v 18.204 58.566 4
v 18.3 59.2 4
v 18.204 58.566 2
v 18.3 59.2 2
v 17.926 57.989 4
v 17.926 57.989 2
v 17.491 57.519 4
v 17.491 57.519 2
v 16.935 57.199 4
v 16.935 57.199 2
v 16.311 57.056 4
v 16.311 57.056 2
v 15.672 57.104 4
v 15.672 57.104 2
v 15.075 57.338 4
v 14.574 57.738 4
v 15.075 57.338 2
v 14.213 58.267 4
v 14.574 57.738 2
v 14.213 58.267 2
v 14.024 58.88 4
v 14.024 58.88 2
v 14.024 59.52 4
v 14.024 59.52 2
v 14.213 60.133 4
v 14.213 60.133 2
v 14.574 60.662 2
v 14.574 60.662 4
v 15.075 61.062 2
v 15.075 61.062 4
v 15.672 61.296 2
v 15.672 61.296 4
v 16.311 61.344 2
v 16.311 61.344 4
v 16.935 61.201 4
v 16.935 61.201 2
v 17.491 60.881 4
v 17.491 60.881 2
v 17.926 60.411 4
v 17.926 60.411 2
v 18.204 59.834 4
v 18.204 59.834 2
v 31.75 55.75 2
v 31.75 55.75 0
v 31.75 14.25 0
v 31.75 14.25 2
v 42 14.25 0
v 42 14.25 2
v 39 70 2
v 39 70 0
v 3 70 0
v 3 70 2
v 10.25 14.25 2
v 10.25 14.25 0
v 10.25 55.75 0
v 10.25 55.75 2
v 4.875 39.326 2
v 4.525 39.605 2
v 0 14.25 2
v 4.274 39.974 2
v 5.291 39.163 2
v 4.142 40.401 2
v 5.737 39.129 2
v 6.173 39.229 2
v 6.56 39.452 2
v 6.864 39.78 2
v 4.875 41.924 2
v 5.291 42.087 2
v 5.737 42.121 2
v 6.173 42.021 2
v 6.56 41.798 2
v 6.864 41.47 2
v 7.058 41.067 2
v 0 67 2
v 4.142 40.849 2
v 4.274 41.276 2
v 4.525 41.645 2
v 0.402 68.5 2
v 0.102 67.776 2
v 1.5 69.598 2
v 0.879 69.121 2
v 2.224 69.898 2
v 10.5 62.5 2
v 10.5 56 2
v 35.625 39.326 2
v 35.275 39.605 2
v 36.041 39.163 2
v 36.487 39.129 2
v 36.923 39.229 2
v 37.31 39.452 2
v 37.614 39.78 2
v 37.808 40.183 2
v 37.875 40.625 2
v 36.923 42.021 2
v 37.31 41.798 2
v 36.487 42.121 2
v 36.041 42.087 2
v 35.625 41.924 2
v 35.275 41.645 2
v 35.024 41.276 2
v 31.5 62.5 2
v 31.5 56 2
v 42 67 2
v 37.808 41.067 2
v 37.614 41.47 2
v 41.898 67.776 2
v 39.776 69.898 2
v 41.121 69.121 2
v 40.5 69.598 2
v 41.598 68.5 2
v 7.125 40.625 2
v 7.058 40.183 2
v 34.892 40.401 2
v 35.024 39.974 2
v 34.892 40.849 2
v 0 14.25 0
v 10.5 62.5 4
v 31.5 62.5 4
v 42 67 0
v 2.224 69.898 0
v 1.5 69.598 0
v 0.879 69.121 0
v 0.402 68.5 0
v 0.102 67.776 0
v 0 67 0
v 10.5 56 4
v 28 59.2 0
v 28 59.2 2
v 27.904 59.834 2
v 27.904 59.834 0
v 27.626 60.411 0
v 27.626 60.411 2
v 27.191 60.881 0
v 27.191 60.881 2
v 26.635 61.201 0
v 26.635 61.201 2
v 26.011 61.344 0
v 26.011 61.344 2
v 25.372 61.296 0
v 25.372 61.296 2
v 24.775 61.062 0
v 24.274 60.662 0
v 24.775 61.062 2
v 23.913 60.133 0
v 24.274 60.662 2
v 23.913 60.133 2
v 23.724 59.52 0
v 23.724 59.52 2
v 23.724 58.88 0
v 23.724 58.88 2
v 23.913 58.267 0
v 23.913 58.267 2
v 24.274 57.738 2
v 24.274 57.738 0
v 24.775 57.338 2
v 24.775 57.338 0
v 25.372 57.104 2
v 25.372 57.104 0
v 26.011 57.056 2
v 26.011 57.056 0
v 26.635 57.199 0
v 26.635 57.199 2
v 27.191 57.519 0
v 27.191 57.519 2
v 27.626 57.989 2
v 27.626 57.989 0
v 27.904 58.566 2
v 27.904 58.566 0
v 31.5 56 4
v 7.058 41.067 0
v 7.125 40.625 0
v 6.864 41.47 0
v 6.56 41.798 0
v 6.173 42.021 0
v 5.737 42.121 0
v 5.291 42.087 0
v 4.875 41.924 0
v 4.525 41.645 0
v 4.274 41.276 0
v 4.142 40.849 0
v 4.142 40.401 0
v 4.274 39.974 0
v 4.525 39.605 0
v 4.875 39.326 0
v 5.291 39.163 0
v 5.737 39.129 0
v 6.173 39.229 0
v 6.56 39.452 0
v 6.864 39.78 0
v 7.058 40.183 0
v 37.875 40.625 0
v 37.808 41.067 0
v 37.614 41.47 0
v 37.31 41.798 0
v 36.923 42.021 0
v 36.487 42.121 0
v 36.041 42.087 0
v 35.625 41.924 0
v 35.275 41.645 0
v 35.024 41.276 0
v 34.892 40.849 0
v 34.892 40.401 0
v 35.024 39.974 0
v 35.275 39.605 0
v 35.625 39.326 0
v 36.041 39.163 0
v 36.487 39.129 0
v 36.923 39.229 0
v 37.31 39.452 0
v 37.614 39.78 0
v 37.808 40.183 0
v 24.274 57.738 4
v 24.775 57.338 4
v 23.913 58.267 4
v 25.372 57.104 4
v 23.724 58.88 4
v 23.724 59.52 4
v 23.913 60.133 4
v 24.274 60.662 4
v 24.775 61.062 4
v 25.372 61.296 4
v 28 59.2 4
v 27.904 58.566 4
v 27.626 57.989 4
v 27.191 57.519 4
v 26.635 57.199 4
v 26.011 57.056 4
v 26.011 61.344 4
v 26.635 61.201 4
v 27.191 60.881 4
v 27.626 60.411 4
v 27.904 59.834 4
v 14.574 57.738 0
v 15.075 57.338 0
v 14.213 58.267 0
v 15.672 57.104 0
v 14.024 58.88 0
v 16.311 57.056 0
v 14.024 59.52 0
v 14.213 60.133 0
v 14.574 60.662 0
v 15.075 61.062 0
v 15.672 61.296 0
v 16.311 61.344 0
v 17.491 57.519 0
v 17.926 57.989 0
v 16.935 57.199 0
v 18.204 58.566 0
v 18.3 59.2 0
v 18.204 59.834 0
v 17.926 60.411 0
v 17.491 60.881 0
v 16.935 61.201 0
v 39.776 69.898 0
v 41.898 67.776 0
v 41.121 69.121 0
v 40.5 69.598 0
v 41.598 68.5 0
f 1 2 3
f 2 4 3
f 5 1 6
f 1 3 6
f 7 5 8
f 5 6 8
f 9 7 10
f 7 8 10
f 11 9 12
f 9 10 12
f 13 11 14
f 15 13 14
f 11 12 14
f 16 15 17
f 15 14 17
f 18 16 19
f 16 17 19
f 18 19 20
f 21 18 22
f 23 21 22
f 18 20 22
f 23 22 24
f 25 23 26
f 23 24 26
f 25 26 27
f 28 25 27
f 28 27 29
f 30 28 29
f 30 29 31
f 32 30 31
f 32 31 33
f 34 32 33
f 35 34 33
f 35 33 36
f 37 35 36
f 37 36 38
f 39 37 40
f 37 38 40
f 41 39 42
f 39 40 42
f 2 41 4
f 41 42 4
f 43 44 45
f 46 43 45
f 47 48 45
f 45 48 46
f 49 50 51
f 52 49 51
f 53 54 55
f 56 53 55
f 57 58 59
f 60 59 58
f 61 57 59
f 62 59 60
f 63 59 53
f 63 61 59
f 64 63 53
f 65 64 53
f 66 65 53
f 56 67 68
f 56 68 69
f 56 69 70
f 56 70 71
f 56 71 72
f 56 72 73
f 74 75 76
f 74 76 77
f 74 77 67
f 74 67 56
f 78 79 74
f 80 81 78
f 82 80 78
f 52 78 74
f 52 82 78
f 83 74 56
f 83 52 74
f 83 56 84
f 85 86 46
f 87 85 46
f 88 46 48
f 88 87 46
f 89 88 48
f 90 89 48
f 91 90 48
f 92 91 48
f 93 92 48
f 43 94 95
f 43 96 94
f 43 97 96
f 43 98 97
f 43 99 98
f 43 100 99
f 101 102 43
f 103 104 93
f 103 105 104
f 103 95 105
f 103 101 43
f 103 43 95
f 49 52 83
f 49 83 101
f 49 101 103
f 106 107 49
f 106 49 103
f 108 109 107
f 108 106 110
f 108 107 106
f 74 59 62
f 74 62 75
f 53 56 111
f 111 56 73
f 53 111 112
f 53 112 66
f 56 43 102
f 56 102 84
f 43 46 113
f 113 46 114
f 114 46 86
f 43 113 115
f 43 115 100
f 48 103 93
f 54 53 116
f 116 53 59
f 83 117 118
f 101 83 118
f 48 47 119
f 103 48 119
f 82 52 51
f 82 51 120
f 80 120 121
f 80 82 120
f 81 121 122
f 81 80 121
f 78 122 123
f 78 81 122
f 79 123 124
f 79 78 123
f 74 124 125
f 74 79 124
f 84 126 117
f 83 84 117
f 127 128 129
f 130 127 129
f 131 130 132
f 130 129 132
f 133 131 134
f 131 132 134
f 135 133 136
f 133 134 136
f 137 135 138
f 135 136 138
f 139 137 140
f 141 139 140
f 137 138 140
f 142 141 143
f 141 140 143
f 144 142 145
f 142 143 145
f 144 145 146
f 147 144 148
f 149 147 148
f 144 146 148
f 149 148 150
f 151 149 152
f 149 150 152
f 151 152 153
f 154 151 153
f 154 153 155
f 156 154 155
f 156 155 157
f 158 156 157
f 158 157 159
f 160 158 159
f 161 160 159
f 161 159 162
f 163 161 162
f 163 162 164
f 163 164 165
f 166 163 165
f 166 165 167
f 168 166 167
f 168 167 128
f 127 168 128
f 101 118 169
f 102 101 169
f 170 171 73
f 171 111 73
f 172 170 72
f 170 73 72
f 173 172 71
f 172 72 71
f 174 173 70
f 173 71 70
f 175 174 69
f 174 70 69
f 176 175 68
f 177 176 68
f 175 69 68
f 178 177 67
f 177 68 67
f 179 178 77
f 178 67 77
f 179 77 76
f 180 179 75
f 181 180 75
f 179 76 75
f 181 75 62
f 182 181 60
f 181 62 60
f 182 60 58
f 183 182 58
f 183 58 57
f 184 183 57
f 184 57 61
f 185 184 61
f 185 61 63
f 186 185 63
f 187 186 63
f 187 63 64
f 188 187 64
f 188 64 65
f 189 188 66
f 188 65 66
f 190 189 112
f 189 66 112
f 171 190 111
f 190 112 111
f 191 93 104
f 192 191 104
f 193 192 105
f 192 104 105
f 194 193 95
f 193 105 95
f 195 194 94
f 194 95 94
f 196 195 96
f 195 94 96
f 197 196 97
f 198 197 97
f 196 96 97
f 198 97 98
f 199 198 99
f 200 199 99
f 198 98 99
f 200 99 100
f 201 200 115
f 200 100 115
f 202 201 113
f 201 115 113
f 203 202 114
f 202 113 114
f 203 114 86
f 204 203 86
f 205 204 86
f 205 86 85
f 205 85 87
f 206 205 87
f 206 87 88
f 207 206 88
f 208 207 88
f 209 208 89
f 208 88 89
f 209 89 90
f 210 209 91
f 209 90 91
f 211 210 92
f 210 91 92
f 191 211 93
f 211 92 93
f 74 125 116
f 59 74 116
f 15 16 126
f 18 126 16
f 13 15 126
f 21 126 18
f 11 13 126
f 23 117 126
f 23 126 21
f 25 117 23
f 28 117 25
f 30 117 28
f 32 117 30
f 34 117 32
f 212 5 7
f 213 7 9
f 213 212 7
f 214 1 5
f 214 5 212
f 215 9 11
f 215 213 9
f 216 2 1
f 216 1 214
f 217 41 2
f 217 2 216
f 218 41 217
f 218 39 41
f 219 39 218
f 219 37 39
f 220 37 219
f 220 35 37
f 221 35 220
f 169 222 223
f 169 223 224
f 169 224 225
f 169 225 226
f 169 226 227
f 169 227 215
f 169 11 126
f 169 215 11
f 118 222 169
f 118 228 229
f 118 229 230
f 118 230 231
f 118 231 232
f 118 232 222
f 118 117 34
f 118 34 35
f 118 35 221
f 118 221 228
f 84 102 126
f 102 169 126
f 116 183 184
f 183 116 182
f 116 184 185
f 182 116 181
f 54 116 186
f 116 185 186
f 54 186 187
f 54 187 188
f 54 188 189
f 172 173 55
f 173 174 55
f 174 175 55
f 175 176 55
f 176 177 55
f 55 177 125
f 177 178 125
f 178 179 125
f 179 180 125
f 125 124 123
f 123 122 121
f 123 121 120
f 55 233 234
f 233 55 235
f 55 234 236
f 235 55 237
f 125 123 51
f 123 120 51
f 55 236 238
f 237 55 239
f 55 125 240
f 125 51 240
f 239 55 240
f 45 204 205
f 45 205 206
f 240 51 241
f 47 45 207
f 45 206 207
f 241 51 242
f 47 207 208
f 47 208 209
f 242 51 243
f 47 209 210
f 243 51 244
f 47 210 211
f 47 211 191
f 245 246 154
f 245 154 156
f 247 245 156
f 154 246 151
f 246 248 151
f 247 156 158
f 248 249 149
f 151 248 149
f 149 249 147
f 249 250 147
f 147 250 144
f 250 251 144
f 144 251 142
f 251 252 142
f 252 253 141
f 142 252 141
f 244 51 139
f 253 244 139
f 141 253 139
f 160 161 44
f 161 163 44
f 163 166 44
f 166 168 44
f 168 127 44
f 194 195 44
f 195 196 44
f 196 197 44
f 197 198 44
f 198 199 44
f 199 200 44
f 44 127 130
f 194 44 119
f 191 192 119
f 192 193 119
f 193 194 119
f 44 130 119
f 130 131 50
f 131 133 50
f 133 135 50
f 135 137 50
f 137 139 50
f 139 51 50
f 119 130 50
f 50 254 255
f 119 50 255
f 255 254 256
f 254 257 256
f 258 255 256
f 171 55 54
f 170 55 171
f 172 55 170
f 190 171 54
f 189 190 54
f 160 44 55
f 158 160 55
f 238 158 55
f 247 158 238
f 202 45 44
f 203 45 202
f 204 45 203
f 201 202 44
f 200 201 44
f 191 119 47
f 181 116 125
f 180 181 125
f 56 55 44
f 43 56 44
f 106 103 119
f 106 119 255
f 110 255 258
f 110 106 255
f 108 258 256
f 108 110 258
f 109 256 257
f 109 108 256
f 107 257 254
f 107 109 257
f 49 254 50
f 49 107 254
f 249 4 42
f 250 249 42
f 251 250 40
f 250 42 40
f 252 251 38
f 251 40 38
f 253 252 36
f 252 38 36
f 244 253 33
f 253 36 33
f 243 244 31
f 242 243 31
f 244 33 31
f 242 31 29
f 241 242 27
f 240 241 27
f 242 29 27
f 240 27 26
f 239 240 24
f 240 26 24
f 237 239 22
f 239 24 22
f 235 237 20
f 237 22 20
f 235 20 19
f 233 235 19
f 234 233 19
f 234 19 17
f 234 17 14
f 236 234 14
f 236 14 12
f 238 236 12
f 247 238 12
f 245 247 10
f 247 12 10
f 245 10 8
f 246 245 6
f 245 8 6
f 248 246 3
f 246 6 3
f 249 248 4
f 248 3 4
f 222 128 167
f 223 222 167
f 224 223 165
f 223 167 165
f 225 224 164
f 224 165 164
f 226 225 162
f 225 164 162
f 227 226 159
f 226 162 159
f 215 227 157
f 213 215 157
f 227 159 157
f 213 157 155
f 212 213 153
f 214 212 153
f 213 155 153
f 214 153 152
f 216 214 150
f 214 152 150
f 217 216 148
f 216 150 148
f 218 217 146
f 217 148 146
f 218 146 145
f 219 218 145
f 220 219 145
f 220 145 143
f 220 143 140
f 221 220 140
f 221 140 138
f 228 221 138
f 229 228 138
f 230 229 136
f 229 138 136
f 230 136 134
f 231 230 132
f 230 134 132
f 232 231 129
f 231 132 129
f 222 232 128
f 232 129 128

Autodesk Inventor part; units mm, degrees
ref_plane "YZ Plane" through (0, 0, 0) normal (1, 0, 0) x (0, 1, 0)
ref_plane "XZ Plane" through (0, 0, 0) normal (0, 1, 0) x (-1, 0, 0)
ref_plane "XY Plane" through (0, 0, 0) normal (0, 0, 1) x (1, 0, 0)
sketch "Sketch1" plane through (0, 0, 0) normal (0, 0, 1) x (1, 0, 0)
  line L0 (0, 0) -> (42, 0)
  line L1 (42, 0) -> (42, 70)
  line L2 (42, 70) -> (0, 70)
  line L3 (0, 70) -> (0, 0)
  line L4 (31.75, 14.25) -> (10.25, 14.25)
  line L5 (10.25, 14.25) -> (10.25, 55.75)
  line L6 (10.25, 55.75) -> (31.75, 55.75)
  line L7 (31.75, 55.75) -> (31.75, 14.25)
  line L8 (31.75, 14.25) -> (10.25, 55.75) construction
  line L9 (10.25, 14.25) -> (31.75, 55.75) construction
  line L10 (21, 70) -> (21, 0)
  line L11 (0, 35) -> (42, 35)
  point P0 (21, 35)
  point P1 (10.8, 7)
  point P2 (31.2, 7)
  point P3 (31.2, 0)
  point P4 (10.8, 0)
  point P5 (31.75, 35)
  point P6 (21, 35)
  point P7 (10.25, 35)
  point P8 (21, 14.25)
  point P9 (21, 55.75)
  dimension "d0" = 42
  dimension "d1" = 70
  dimension "d4" = 21.5
  dimension "d5" = 41.5
extrude "Extrusion1" add sketch "Sketch1" along normal blind 2
fillet "Fillet3" radius 3 2 edges at (42, 70, 1) (0, 70, 1)
extrude "Extrusion11" cut sketch "Sketch1" along normal blind 6 contours L10 L11 L7 L4 | L4 L5 L11 L10 | L5 L6 L10 L11 | L10 L6 L7 L11
sketch "Sketch14" plane through (0, 0, 2) normal (0, 0, 1) x (1, 0, 0)
  line L0 (31.75, 55.75) -> (10.25, 55.75) projected
  circle A0 centre (16.15, 59.2) radius 2.15
  circle A1 centre (25.85, 59.2) radius 2.15
  line L1 (16.15, 59.2) -> (25.85, 59.2)
  line L2 (10.8, 35) -> (31.2, 35)
  circle A2 centre (16.15, 10.8) radius 2.15
  circle A3 centre (25.85, 10.8) radius 2.15
  line L3 (16.15, 10.8) -> (25.85, 10.8)
  line L4 (0, 0) -> (42, 0) projected
  arc A4 (3, 70) -> (0, 67) centre (3, 67) ccw projected
  line L5 (0, 67) -> (0, 0) projected
  line L6 (42, 0) -> (42, 67) projected
  arc A5 (42, 67) -> (39, 70) centre (39, 67) ccw projected
  line L7 (39, 70) -> (3, 70) projected
  point P0 (21, 59.2)
  dimension "d54" = 4.3
  dimension "d55" = 4.3
  dimension "d56" = 9.7
extrude "Extrusion12" cut sketch "Sketch14" against normal blind 6 contours A0 | A1 | A2 | A3
sketch "Sketch17" plane through (0, 0, 2) normal (0, 0, 1) x (1, 0, 0)
  circle A0 centre (16.15, 10.8) radius 2.15 projected
  circle A1 centre (25.85, 59.2) radius 2.15 projected
  circle A2 centre (25.85, 10.8) radius 2.15 projected
  circle A3 centre (16.15, 59.2) radius 2.15 projected
  line L0 (10.25, 55.75) -> (31.75, 55.75) projected
  line L1 (31.75, 55.75) -> (31.75, 14.25) projected
  line L2 (31.75, 14.25) -> (10.25, 14.25) projected
  line L3 (10.25, 14.25) -> (10.25, 55.75) projected
  circle A4 centre (16.15, 59.2) radius 2.15 projected
  circle A5 centre (25.85, 59.2) radius 2.15 projected
  line L4 (16.15, 61.35) -> (25.85, 61.35)
  line L5 (25.85, 59.2) -> (25.85, 61.35)
  line L6 (14, 59.2) -> (14, 55.75)
  line L7 (28, 59.2) -> (28, 55.75)
  line L8 (10.25, 55.75) -> (10.25, 14.25) projected
  line L9 (10.25, 55.75) -> (10.25, 62.75)
  line L10 (10.25, 62.75) -> (31.75, 62.75)
  line L11 (31.75, 62.75) -> (31.75, 55.75)
  line L12 (0, 0) -> (42, 0) projected
  arc A6 (3, 70) -> (0, 67) centre (3, 67) ccw projected
  line L13 (0, 67) -> (0, 0) projected
  line L14 (42, 0) -> (42, 67) projected
  arc A7 (42, 67) -> (39, 70) centre (39, 67) ccw projected
  line L15 (39, 70) -> (3, 70) projected
  dimension "d67" = 7
extrude "Extrusion15" add sketch "Sketch17" along normal blind 2 contours L7 L0 L6 A3 L4 A1 | A1 L4 A3 L6 L0 L9 L10 L11 L7
sketch "Sketch18" plane through (0, 0, 2) normal (0, 0, 1) x (1, 0, 0)
  line L0 (10.25, 14.25) -> (10.25, 55.75) projected
  line L1 (10.25, 62.75) -> (31.75, 62.75) projected
  line L2 (31.75, 55.75) -> (31.75, 14.25) projected
  line L3 (31.75, 14.25) -> (10.25, 14.25) projected
  circle A0 centre (25.85, 10.8) radius 2.15 projected
  circle A1 centre (16.15, 10.8) radius 2.15 projected
  line L4 (10.25, 40.625) -> (5.625, 40.625)
  line L5 (5.625, 40.625) -> (5.625, 69)
  circle A2 centre (5.625, 40.625) radius 1.5
  line L6 (21, 80.706) -> (21, -3.1342)
  circle A3 centre (36.375, 40.625) radius 1.5
  line L7 (0, 0) -> (42, 0) projected
  arc A4 (3, 70) -> (0, 67) centre (3, 67) ccw projected
  line L8 (0, 67) -> (0, 0) projected
  line L9 (42, 0) -> (42, 67) projected
  arc A5 (42, 67) -> (39, 70) centre (39, 67) ccw projected
  line L10 (39, 70) -> (3, 70) projected
  line L11 (10.25, 55.75) -> (10.25, 62.75) projected
  line L12 (31.75, 62.75) -> (31.75, 55.75) projected
  dimension "d70" = 4.625
  dimension "d71" = 28.375
  dimension "d72" = 3
  dimension "d75" = 30.75
extrude "Extrusion16" cut sketch "Sketch18" against normal blind 10 contours A2 L5 L4 | L4 L5 A2 | A3
sketch "Sketch22" plane through (0, 0, 2) normal (0, 0, 1) x (1, 0, 0)
  point P0 (0, 0)
sketch "Sketch23" plane through (0, 0, 4) normal (0, 0, 1) x (1, 0, 0)
  line L0 (31.75, 55.75) -> (31.75, 62.75) projected
  line L1 (31.75, 62.75) -> (10.25, 62.75) projected
  line L2 (10.25, 62.75) -> (10.25, 55.75) projected
  line L3 (10.25, 55.75) -> (31.75, 55.75) projected
  circle A0 centre (25.85, 59.2) radius 2.15 projected
  circle A1 centre (16.15, 59.2) radius 2.15 projected
  line L4 (10.5, 56) -> (10.5, 62.5)
  line L5 (10.5, 62.5) -> (31.5, 62.5)
  line L6 (31.5, 62.5) -> (31.5, 56)
  line L7 (31.5, 56) -> (10.5, 56)
  point P0 (0, 0)
  dimension "d88" = 0.25
extrude "Extrusion20" cut sketch "Sketch23" against normal blind 2 contours L3 L2 L1 L0
sketch "Sketch24" plane through (0, 0, 2) normal (0, 0, 1) x (1, 0, 0)
  line L0 (10.5, 62.5) -> (10.5, 56) projected
  line L1 (31.5, 62.5) -> (10.5, 62.5) projected
  line L2 (31.5, 56) -> (31.5, 62.5) projected
  line L3 (10.5, 56) -> (31.5, 56) projected
  circle A0 centre (5.625, 40.625) radius 1.5 projected
  circle A1 centre (36.375, 40.625) radius 1.5 projected
  arc A2 (3, 70) -> (0, 67) centre (3, 67) ccw projected
  line L4 (0, 67) -> (0, 0) projected
  line L5 (0, 0) -> (42, 0) projected
  line L6 (42, 0) -> (42, 67) projected
  arc A3 (42, 67) -> (39, 70) centre (39, 67) ccw projected
  line L7 (39, 70) -> (3, 70) projected
  line L8 (31.75, 55.75) -> (10.25, 55.75) projected
  line L9 (31.75, 55.75) -> (31.75, 14.25) projected
  line L10 (31.75, 14.25) -> (10.25, 14.25) projected
  line L11 (10.25, 14.25) -> (10.25, 55.75) projected
  circle A4 centre (25.85, 10.8) radius 2.15 projected
  circle A5 centre (16.15, 10.8) radius 2.15 projected
  line L12 (42, 14.25) -> (0, 14.25)
  line L13 (0, 14.25) -> (0, 0)
  line L14 (0, 0) -> (42, 0)
  line L15 (42, 0) -> (42, 14.25)
  point P0 (31.75, 14.25)
extrude "Extrusion21" cut sketch "Sketch24" against normal blind 10 contours L12 L10 L6 L5 L4
properties part number "MG995_26_upgrade_3DPrint"
